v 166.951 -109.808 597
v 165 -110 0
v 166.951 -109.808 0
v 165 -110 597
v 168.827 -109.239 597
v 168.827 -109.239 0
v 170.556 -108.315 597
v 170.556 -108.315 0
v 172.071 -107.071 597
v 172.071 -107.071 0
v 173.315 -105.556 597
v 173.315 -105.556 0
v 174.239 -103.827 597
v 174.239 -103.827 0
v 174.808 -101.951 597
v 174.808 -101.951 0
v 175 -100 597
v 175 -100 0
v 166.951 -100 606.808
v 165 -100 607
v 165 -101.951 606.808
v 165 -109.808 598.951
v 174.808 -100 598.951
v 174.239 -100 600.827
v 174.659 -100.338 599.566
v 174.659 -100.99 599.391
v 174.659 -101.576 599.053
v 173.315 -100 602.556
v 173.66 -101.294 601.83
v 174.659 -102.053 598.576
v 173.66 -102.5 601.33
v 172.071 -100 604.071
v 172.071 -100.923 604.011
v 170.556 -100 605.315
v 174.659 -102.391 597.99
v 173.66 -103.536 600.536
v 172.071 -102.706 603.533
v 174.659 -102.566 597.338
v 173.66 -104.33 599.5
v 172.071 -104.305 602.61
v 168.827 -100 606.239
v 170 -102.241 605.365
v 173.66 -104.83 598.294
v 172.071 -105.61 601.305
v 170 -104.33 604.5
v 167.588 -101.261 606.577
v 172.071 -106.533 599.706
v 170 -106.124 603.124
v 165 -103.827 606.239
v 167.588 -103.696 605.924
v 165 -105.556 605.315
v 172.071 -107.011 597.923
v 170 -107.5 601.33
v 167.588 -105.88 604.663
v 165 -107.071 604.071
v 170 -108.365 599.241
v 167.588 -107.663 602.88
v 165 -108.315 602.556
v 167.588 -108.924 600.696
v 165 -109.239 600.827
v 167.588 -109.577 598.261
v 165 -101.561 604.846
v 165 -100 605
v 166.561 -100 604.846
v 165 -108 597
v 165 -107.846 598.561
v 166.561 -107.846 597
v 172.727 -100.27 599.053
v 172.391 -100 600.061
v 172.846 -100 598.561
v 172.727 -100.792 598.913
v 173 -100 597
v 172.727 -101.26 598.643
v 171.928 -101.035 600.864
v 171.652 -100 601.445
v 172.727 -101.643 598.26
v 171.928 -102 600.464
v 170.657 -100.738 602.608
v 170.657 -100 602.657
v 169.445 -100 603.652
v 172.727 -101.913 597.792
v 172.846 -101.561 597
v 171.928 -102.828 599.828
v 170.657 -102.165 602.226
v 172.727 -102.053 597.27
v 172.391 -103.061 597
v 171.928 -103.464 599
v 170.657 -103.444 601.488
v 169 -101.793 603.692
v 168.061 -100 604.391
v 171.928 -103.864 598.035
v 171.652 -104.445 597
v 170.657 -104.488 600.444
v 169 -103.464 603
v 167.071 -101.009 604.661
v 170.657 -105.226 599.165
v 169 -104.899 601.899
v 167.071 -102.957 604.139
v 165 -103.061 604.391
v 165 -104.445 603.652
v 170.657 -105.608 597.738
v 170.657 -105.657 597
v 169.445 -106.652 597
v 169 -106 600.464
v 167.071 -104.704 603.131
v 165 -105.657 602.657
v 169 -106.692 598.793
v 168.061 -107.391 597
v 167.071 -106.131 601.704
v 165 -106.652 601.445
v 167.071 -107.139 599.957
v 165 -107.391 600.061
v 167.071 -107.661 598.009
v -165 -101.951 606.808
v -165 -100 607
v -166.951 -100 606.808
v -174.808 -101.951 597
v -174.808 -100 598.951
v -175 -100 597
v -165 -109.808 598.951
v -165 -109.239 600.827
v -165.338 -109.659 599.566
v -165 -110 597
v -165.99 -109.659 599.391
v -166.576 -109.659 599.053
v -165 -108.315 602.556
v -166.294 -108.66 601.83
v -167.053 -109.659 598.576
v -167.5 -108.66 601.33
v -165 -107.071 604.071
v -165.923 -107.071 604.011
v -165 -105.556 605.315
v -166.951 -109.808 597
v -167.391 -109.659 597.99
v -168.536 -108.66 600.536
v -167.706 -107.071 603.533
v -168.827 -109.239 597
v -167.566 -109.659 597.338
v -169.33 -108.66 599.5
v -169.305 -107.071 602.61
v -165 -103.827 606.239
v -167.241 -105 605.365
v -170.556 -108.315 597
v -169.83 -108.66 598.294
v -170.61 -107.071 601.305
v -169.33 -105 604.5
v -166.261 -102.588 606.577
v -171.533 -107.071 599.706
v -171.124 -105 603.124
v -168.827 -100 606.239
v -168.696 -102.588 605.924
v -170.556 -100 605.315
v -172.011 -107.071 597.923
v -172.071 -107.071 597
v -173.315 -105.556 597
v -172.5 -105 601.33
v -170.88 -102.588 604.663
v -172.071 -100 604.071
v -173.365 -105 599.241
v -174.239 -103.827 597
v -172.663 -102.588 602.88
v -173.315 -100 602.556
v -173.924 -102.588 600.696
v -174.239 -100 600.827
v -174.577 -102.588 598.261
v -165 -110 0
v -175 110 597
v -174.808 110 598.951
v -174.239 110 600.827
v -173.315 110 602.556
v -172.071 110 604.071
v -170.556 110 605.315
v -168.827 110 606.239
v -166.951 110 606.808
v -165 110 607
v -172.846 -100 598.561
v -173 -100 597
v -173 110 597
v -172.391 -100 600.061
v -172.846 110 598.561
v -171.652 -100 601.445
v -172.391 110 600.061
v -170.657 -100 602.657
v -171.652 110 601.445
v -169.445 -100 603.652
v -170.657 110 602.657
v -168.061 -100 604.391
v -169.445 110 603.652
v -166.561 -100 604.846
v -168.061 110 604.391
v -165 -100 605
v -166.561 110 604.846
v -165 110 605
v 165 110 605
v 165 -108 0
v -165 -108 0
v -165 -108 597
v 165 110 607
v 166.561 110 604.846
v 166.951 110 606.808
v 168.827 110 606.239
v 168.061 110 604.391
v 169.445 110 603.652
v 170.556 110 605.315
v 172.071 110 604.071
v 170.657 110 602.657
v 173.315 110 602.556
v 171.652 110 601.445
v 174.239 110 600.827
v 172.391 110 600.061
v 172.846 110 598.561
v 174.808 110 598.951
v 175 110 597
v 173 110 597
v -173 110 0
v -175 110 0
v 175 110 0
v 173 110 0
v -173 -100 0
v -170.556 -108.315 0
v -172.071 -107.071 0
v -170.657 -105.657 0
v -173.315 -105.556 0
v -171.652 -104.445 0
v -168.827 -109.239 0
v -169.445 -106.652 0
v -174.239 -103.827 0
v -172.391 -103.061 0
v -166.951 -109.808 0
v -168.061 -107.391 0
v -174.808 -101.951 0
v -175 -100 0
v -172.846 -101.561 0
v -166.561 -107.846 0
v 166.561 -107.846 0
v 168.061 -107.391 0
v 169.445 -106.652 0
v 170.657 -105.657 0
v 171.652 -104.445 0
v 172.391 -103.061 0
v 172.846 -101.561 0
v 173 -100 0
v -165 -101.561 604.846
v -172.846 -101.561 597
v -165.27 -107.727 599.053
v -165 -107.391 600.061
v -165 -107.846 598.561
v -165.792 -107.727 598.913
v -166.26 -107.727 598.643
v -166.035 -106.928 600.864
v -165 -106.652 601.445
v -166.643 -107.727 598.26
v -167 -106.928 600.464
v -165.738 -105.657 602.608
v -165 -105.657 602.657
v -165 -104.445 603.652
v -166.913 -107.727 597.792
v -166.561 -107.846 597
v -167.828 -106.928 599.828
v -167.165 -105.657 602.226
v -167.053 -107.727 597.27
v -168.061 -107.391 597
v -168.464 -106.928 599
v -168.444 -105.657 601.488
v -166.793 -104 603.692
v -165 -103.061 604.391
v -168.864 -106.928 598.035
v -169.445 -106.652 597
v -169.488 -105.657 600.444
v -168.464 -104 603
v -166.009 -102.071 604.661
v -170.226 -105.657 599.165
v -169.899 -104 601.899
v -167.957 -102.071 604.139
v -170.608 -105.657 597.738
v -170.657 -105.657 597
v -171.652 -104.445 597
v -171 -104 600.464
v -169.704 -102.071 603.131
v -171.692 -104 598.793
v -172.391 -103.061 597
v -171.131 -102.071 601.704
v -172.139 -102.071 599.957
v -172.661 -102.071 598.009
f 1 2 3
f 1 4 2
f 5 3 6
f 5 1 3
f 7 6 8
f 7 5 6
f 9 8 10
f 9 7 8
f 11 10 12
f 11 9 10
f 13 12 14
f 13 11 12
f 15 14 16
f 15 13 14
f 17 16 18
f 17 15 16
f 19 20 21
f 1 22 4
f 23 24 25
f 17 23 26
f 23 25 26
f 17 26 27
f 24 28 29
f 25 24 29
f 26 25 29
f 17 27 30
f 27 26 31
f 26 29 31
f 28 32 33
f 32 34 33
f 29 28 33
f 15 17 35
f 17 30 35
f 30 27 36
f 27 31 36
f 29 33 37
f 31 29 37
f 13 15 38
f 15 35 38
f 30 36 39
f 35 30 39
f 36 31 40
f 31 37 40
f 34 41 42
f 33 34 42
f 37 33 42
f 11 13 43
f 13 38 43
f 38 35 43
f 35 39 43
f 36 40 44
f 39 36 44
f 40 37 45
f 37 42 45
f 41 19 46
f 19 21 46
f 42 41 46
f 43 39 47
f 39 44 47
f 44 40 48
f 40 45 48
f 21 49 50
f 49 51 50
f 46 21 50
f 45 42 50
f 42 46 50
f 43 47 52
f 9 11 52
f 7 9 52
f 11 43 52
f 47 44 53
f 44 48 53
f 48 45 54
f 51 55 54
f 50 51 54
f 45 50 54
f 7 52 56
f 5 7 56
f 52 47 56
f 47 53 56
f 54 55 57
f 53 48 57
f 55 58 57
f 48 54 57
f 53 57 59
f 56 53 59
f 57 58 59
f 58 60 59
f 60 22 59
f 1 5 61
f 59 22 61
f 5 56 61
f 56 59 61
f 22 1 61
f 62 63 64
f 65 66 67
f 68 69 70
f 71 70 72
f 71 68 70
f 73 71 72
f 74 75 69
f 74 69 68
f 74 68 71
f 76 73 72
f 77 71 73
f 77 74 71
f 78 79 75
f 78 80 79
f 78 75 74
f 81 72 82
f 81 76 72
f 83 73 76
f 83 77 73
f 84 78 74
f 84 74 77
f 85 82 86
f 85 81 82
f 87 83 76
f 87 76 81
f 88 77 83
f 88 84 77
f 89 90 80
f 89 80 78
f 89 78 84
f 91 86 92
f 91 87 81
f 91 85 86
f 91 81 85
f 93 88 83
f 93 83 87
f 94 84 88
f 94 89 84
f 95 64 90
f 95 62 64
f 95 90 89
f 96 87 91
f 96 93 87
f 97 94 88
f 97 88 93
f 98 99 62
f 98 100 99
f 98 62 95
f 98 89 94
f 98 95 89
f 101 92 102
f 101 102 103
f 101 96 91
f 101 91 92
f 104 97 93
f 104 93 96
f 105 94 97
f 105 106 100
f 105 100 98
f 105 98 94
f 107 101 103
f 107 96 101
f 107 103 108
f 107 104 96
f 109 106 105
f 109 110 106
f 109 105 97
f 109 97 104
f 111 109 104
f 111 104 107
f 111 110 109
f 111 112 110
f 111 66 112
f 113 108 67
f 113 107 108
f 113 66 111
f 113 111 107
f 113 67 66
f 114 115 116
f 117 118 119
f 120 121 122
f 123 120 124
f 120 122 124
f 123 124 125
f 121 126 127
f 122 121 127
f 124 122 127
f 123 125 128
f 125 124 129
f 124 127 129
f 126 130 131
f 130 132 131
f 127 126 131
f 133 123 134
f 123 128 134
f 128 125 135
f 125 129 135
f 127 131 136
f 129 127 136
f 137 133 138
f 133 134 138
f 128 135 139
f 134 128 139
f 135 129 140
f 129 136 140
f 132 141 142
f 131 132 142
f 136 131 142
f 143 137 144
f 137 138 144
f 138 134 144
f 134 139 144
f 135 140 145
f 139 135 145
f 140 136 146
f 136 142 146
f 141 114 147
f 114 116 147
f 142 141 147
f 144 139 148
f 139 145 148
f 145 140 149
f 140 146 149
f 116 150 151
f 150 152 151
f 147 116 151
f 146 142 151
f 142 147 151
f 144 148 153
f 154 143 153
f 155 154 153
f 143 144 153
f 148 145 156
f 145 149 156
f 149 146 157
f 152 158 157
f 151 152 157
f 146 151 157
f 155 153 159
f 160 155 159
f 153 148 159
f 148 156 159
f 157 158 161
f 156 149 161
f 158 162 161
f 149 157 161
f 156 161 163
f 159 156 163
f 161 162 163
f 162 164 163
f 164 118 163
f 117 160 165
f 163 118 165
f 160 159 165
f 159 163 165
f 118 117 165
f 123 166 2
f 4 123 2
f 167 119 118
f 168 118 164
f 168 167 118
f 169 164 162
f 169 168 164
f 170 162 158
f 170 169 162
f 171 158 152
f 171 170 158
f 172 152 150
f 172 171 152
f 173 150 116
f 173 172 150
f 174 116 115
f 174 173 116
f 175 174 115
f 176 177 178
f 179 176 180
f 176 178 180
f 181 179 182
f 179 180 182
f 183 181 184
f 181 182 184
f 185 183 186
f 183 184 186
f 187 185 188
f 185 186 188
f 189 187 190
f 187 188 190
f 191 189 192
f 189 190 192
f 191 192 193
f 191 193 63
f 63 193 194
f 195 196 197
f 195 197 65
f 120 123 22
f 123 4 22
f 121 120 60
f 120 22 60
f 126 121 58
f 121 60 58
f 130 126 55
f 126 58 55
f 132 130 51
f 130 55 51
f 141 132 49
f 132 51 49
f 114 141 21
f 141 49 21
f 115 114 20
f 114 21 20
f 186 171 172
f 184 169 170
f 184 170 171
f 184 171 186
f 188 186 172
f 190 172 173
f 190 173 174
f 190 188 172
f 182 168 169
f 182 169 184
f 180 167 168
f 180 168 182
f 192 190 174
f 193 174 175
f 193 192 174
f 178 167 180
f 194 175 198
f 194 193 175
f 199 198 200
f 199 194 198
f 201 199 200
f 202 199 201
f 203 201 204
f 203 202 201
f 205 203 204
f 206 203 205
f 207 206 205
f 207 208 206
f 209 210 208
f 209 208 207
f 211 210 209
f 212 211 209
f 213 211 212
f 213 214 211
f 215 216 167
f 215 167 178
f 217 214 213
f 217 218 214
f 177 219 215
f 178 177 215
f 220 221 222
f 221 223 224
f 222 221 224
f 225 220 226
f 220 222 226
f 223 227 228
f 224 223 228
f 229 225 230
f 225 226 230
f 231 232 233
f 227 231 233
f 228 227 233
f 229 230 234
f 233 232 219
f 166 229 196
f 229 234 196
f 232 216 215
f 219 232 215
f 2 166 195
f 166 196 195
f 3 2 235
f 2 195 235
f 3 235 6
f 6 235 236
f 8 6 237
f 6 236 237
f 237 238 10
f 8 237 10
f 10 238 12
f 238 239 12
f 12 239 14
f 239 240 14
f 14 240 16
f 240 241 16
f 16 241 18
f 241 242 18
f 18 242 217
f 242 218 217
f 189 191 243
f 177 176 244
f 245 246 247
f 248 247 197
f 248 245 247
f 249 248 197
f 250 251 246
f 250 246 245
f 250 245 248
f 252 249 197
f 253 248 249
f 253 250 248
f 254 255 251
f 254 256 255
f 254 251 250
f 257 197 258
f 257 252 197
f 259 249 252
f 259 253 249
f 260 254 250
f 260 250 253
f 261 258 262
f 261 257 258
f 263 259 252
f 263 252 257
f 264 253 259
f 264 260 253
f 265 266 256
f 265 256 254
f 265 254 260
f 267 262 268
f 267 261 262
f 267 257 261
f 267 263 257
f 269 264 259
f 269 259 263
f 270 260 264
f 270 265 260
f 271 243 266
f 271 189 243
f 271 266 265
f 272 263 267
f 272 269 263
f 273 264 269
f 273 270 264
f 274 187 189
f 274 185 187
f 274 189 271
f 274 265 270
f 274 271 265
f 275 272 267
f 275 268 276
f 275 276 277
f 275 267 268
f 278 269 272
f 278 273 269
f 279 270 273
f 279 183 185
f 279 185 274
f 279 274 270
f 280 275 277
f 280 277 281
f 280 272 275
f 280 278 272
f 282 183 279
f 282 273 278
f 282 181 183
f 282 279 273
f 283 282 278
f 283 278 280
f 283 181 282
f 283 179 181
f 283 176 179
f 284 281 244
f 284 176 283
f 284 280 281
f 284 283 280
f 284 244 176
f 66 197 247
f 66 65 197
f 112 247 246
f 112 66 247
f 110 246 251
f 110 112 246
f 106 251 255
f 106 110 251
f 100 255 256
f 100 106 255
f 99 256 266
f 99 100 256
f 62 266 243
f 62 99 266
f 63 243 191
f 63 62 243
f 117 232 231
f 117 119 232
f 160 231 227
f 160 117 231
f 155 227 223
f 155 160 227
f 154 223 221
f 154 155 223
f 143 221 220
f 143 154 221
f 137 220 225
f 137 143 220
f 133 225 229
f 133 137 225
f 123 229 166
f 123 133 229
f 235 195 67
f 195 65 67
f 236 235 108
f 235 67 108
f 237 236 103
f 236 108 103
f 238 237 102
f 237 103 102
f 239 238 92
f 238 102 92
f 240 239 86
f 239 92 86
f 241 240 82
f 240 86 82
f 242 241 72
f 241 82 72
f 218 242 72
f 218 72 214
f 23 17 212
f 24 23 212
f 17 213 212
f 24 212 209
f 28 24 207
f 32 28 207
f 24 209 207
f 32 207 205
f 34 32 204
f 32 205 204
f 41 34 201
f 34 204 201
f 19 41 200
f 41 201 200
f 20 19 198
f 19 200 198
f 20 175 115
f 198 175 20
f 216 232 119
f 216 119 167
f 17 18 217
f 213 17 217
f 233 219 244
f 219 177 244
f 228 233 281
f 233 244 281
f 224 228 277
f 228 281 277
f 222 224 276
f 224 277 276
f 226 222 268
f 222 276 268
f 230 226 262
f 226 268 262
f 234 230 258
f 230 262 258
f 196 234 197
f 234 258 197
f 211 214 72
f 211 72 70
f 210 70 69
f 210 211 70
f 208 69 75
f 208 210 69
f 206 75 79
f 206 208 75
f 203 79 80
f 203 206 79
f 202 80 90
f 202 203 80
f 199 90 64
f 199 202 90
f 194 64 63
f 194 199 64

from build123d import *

# Parameters (mm, degrees)
SKETCH_1_W      = 350
SKETCH_1_H      = 220
EXTRUDE_1_DEPTH = 607
FILLET_1_R      = 10
SHELL_1_T       = -2


with BuildPart() as part:
    # 草图1 → 凸台-拉伸1 (new body)
    with BuildSketch(Plane.XY):
        Rectangle(SKETCH_1_W, SKETCH_1_H)
    extrude(amount=EXTRUDE_1_DEPTH)

    # 圆角1
    fillet_1_edges = [part.edges().sort_by_distance(p)[0] for p in [
        (-175, 0, 607),
        (0, -110, 607),
        (175, 0, 607),
        (175, -110, 303.5),
        (-175, -110, 303.5),
    ]]
    fillet(fillet_1_edges, radius=FILLET_1_R)

    # 抽壳1
    shell_1_openings = [part.faces().sort_by_distance(p)[0] for p in [
        (0, 0.060103243, 0),
        (0, 110, 303.439124152),
    ]]
    offset(amount=SHELL_1_T, openings=shell_1_openings, kind=Kind.INTERSECTION)


solid = part.part
